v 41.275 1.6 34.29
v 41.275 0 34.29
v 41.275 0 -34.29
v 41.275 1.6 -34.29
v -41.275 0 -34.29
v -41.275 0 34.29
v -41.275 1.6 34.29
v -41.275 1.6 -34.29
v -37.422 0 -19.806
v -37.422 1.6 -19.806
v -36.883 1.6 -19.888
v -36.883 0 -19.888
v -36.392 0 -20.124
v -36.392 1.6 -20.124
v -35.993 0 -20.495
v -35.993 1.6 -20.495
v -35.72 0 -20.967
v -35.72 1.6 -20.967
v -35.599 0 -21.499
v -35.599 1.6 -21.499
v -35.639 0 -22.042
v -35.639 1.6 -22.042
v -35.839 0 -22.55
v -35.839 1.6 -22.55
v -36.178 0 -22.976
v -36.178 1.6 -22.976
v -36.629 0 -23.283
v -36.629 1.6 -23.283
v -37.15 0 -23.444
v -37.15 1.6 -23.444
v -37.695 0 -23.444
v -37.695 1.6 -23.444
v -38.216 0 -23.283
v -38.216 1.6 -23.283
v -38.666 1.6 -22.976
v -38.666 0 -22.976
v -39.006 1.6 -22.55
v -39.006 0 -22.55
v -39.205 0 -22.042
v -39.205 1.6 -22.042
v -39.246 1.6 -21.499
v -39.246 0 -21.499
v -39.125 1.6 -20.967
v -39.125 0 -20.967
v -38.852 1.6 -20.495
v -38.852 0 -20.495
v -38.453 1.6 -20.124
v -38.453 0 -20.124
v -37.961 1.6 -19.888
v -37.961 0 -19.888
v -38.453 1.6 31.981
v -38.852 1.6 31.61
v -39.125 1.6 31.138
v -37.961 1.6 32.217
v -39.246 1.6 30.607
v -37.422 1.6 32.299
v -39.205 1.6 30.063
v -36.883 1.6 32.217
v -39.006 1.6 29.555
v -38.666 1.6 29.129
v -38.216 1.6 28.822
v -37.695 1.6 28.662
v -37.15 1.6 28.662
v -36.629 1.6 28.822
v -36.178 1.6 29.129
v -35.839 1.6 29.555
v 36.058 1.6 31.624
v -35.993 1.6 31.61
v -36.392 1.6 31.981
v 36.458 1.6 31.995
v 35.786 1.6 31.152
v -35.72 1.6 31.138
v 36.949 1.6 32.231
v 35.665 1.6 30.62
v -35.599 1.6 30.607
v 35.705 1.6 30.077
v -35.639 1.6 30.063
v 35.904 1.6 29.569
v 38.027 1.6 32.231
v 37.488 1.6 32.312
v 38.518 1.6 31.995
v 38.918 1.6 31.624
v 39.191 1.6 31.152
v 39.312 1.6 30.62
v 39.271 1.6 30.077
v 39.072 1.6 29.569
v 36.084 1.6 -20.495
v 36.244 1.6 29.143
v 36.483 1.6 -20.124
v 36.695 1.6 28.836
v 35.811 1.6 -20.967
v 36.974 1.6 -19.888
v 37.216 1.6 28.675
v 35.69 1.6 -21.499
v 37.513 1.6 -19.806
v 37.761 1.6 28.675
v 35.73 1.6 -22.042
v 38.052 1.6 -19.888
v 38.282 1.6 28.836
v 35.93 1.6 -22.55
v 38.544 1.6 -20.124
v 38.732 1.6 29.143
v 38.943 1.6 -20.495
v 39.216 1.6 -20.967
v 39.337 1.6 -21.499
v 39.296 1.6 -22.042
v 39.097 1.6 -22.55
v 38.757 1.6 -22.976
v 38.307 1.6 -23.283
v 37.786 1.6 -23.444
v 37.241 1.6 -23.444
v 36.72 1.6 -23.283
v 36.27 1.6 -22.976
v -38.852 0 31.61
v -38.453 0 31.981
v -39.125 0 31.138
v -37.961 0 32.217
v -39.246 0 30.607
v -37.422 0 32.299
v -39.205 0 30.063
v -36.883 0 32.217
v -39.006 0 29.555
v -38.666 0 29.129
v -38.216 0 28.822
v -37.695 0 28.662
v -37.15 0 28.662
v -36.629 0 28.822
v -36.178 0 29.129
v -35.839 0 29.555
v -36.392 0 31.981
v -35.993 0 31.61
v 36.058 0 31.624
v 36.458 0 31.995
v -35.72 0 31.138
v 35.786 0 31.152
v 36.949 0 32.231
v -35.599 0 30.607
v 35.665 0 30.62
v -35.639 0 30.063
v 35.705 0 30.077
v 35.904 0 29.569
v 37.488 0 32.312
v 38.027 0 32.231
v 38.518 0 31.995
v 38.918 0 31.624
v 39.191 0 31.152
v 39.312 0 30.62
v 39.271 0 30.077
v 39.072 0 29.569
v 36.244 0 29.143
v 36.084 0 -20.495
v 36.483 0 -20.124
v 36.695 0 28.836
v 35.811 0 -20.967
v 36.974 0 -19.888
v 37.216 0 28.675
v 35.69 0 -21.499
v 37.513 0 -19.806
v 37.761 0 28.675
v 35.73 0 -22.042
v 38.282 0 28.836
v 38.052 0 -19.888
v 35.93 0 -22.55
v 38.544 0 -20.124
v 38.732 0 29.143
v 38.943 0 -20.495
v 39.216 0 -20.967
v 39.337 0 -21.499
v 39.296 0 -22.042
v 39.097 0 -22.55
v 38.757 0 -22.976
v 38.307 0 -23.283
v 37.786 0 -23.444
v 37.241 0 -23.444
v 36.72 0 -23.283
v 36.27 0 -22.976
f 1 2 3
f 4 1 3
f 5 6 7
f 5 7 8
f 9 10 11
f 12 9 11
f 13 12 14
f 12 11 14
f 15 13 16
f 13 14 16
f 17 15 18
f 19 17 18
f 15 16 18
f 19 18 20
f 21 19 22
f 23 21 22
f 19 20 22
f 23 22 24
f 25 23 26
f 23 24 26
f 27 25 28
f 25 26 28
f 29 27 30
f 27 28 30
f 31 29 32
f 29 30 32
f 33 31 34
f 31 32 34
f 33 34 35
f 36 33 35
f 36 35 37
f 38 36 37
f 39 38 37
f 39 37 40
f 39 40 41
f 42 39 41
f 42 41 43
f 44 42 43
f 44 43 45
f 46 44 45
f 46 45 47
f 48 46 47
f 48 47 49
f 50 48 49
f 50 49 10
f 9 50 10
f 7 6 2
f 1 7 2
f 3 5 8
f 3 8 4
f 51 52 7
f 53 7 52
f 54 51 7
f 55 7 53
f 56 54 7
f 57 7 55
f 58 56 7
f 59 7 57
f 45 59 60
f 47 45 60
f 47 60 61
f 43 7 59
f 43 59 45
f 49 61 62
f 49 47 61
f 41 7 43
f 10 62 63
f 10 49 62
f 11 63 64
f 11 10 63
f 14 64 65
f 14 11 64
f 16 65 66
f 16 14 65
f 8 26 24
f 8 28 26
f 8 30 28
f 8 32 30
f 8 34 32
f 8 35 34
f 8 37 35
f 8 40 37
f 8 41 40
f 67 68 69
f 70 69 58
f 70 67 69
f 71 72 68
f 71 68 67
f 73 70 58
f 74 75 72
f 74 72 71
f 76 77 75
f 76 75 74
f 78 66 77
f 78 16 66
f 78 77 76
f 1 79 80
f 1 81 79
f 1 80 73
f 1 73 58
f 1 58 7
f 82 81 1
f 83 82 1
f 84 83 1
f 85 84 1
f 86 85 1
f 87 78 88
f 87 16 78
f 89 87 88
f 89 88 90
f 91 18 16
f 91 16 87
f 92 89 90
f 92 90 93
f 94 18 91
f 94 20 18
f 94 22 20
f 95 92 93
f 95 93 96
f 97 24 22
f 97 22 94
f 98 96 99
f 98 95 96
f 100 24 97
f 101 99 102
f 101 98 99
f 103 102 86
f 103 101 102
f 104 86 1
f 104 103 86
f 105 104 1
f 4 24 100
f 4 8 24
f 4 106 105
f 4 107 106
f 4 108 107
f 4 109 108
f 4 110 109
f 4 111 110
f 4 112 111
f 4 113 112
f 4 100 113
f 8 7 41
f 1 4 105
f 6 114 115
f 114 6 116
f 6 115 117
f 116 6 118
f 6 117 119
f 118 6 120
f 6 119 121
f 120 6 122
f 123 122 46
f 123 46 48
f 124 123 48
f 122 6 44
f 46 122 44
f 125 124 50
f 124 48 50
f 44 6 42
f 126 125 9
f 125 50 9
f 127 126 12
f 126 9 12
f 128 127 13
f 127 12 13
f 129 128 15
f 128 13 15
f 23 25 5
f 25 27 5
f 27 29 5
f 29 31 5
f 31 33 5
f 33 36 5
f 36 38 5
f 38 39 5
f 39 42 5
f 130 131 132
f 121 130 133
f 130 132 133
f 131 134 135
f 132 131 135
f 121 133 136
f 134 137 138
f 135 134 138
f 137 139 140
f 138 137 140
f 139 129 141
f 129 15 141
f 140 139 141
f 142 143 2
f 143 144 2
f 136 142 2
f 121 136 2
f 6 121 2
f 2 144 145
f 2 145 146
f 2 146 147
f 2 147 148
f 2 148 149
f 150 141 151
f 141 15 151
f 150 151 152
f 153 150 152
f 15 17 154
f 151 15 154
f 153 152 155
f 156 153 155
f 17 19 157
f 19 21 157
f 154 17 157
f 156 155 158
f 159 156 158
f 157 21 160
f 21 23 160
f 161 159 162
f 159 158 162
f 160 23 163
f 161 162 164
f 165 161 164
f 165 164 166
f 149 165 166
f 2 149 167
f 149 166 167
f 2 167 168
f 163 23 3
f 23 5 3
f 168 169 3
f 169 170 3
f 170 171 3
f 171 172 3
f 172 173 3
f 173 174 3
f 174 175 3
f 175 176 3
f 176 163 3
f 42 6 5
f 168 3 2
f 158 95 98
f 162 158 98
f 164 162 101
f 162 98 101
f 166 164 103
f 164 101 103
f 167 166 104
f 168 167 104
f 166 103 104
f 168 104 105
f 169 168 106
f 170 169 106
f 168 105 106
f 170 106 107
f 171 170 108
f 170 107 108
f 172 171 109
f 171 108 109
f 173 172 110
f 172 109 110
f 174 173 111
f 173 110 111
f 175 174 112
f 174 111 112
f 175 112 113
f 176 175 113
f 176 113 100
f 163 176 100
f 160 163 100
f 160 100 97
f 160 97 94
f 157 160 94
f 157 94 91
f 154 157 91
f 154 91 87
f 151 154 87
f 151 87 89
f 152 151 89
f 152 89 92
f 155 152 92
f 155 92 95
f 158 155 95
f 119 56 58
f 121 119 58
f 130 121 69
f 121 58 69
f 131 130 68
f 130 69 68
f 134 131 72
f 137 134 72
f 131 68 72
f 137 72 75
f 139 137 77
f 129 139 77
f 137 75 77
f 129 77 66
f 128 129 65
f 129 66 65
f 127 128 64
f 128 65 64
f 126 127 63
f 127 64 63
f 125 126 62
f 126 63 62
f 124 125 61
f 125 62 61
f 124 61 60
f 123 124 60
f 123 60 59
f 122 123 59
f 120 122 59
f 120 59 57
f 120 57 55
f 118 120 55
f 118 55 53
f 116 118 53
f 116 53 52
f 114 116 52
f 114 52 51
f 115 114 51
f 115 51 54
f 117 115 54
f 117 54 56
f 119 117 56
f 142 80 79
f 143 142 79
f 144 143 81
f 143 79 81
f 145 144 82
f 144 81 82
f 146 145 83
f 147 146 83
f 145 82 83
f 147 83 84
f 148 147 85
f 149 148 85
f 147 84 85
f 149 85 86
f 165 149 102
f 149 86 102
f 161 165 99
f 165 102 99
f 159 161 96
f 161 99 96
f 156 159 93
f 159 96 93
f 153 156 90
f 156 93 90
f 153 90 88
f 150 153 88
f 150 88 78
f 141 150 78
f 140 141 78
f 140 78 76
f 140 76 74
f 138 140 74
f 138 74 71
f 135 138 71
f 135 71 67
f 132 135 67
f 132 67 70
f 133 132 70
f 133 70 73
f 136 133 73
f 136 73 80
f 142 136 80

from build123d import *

# Parameters (mm, degrees)
SKETCH1_W           = 82.55
SKETCH1_H           = 68.58
BOSS_EXTRUDE1_DEPTH = 1.6002
SKETCH2_R           = 1.8288
CUT_EXTRUDE1_DEPTH  = 54.684172389
SKETCH3_R           = 1.8288
CUT_EXTRUDE2_DEPTH  = 54.684172389


with BuildPart() as part:
    # Sketch1 → Boss-Extrude1 (new body)
    with BuildSketch(Plane(origin=(0, 0, 0), x_dir=(1, 0, 0), z_dir=(0, 1, 0))):
        Rectangle(SKETCH1_W, SKETCH1_H)
    extrude(amount=BOSS_EXTRUDE1_DEPTH)

    # Sketch2 → Cut-Extrude1 (cut, through all)
    with BuildSketch(Plane(origin=(0, 1.6002, 0), x_dir=(1, 0, 0), z_dir=(0, 1, 0))):
        with Locations(Location((37.488189645, -30.483662755, 0), (0, 0, 270))):
            Circle(SKETCH2_R)
    extrude(amount=-CUT_EXTRUDE1_DEPTH, mode=Mode.SUBTRACT)

    # Sketch3 → Cut-Extrude2 (cut, through all)
    with BuildSketch(Plane(origin=(0, 1.6002, 0), x_dir=(1, 0, 0), z_dir=(0, 1, 0))):
        with Locations(Location((37.513427585, 21.635232225, 0), (0, 0, 270))):
            Circle(SKETCH3_R)
        with Locations(Location((-37.422354938, 21.635232225, 0), (0, 0, 270))):
            Circle(SKETCH3_R)
        with Locations(Location((-37.422354938, -30.469898661, 0), (0, 0, 270))):
            Circle(SKETCH3_R)
    extrude(amount=-CUT_EXTRUDE2_DEPTH, mode=Mode.SUBTRACT)


solid = part.part
